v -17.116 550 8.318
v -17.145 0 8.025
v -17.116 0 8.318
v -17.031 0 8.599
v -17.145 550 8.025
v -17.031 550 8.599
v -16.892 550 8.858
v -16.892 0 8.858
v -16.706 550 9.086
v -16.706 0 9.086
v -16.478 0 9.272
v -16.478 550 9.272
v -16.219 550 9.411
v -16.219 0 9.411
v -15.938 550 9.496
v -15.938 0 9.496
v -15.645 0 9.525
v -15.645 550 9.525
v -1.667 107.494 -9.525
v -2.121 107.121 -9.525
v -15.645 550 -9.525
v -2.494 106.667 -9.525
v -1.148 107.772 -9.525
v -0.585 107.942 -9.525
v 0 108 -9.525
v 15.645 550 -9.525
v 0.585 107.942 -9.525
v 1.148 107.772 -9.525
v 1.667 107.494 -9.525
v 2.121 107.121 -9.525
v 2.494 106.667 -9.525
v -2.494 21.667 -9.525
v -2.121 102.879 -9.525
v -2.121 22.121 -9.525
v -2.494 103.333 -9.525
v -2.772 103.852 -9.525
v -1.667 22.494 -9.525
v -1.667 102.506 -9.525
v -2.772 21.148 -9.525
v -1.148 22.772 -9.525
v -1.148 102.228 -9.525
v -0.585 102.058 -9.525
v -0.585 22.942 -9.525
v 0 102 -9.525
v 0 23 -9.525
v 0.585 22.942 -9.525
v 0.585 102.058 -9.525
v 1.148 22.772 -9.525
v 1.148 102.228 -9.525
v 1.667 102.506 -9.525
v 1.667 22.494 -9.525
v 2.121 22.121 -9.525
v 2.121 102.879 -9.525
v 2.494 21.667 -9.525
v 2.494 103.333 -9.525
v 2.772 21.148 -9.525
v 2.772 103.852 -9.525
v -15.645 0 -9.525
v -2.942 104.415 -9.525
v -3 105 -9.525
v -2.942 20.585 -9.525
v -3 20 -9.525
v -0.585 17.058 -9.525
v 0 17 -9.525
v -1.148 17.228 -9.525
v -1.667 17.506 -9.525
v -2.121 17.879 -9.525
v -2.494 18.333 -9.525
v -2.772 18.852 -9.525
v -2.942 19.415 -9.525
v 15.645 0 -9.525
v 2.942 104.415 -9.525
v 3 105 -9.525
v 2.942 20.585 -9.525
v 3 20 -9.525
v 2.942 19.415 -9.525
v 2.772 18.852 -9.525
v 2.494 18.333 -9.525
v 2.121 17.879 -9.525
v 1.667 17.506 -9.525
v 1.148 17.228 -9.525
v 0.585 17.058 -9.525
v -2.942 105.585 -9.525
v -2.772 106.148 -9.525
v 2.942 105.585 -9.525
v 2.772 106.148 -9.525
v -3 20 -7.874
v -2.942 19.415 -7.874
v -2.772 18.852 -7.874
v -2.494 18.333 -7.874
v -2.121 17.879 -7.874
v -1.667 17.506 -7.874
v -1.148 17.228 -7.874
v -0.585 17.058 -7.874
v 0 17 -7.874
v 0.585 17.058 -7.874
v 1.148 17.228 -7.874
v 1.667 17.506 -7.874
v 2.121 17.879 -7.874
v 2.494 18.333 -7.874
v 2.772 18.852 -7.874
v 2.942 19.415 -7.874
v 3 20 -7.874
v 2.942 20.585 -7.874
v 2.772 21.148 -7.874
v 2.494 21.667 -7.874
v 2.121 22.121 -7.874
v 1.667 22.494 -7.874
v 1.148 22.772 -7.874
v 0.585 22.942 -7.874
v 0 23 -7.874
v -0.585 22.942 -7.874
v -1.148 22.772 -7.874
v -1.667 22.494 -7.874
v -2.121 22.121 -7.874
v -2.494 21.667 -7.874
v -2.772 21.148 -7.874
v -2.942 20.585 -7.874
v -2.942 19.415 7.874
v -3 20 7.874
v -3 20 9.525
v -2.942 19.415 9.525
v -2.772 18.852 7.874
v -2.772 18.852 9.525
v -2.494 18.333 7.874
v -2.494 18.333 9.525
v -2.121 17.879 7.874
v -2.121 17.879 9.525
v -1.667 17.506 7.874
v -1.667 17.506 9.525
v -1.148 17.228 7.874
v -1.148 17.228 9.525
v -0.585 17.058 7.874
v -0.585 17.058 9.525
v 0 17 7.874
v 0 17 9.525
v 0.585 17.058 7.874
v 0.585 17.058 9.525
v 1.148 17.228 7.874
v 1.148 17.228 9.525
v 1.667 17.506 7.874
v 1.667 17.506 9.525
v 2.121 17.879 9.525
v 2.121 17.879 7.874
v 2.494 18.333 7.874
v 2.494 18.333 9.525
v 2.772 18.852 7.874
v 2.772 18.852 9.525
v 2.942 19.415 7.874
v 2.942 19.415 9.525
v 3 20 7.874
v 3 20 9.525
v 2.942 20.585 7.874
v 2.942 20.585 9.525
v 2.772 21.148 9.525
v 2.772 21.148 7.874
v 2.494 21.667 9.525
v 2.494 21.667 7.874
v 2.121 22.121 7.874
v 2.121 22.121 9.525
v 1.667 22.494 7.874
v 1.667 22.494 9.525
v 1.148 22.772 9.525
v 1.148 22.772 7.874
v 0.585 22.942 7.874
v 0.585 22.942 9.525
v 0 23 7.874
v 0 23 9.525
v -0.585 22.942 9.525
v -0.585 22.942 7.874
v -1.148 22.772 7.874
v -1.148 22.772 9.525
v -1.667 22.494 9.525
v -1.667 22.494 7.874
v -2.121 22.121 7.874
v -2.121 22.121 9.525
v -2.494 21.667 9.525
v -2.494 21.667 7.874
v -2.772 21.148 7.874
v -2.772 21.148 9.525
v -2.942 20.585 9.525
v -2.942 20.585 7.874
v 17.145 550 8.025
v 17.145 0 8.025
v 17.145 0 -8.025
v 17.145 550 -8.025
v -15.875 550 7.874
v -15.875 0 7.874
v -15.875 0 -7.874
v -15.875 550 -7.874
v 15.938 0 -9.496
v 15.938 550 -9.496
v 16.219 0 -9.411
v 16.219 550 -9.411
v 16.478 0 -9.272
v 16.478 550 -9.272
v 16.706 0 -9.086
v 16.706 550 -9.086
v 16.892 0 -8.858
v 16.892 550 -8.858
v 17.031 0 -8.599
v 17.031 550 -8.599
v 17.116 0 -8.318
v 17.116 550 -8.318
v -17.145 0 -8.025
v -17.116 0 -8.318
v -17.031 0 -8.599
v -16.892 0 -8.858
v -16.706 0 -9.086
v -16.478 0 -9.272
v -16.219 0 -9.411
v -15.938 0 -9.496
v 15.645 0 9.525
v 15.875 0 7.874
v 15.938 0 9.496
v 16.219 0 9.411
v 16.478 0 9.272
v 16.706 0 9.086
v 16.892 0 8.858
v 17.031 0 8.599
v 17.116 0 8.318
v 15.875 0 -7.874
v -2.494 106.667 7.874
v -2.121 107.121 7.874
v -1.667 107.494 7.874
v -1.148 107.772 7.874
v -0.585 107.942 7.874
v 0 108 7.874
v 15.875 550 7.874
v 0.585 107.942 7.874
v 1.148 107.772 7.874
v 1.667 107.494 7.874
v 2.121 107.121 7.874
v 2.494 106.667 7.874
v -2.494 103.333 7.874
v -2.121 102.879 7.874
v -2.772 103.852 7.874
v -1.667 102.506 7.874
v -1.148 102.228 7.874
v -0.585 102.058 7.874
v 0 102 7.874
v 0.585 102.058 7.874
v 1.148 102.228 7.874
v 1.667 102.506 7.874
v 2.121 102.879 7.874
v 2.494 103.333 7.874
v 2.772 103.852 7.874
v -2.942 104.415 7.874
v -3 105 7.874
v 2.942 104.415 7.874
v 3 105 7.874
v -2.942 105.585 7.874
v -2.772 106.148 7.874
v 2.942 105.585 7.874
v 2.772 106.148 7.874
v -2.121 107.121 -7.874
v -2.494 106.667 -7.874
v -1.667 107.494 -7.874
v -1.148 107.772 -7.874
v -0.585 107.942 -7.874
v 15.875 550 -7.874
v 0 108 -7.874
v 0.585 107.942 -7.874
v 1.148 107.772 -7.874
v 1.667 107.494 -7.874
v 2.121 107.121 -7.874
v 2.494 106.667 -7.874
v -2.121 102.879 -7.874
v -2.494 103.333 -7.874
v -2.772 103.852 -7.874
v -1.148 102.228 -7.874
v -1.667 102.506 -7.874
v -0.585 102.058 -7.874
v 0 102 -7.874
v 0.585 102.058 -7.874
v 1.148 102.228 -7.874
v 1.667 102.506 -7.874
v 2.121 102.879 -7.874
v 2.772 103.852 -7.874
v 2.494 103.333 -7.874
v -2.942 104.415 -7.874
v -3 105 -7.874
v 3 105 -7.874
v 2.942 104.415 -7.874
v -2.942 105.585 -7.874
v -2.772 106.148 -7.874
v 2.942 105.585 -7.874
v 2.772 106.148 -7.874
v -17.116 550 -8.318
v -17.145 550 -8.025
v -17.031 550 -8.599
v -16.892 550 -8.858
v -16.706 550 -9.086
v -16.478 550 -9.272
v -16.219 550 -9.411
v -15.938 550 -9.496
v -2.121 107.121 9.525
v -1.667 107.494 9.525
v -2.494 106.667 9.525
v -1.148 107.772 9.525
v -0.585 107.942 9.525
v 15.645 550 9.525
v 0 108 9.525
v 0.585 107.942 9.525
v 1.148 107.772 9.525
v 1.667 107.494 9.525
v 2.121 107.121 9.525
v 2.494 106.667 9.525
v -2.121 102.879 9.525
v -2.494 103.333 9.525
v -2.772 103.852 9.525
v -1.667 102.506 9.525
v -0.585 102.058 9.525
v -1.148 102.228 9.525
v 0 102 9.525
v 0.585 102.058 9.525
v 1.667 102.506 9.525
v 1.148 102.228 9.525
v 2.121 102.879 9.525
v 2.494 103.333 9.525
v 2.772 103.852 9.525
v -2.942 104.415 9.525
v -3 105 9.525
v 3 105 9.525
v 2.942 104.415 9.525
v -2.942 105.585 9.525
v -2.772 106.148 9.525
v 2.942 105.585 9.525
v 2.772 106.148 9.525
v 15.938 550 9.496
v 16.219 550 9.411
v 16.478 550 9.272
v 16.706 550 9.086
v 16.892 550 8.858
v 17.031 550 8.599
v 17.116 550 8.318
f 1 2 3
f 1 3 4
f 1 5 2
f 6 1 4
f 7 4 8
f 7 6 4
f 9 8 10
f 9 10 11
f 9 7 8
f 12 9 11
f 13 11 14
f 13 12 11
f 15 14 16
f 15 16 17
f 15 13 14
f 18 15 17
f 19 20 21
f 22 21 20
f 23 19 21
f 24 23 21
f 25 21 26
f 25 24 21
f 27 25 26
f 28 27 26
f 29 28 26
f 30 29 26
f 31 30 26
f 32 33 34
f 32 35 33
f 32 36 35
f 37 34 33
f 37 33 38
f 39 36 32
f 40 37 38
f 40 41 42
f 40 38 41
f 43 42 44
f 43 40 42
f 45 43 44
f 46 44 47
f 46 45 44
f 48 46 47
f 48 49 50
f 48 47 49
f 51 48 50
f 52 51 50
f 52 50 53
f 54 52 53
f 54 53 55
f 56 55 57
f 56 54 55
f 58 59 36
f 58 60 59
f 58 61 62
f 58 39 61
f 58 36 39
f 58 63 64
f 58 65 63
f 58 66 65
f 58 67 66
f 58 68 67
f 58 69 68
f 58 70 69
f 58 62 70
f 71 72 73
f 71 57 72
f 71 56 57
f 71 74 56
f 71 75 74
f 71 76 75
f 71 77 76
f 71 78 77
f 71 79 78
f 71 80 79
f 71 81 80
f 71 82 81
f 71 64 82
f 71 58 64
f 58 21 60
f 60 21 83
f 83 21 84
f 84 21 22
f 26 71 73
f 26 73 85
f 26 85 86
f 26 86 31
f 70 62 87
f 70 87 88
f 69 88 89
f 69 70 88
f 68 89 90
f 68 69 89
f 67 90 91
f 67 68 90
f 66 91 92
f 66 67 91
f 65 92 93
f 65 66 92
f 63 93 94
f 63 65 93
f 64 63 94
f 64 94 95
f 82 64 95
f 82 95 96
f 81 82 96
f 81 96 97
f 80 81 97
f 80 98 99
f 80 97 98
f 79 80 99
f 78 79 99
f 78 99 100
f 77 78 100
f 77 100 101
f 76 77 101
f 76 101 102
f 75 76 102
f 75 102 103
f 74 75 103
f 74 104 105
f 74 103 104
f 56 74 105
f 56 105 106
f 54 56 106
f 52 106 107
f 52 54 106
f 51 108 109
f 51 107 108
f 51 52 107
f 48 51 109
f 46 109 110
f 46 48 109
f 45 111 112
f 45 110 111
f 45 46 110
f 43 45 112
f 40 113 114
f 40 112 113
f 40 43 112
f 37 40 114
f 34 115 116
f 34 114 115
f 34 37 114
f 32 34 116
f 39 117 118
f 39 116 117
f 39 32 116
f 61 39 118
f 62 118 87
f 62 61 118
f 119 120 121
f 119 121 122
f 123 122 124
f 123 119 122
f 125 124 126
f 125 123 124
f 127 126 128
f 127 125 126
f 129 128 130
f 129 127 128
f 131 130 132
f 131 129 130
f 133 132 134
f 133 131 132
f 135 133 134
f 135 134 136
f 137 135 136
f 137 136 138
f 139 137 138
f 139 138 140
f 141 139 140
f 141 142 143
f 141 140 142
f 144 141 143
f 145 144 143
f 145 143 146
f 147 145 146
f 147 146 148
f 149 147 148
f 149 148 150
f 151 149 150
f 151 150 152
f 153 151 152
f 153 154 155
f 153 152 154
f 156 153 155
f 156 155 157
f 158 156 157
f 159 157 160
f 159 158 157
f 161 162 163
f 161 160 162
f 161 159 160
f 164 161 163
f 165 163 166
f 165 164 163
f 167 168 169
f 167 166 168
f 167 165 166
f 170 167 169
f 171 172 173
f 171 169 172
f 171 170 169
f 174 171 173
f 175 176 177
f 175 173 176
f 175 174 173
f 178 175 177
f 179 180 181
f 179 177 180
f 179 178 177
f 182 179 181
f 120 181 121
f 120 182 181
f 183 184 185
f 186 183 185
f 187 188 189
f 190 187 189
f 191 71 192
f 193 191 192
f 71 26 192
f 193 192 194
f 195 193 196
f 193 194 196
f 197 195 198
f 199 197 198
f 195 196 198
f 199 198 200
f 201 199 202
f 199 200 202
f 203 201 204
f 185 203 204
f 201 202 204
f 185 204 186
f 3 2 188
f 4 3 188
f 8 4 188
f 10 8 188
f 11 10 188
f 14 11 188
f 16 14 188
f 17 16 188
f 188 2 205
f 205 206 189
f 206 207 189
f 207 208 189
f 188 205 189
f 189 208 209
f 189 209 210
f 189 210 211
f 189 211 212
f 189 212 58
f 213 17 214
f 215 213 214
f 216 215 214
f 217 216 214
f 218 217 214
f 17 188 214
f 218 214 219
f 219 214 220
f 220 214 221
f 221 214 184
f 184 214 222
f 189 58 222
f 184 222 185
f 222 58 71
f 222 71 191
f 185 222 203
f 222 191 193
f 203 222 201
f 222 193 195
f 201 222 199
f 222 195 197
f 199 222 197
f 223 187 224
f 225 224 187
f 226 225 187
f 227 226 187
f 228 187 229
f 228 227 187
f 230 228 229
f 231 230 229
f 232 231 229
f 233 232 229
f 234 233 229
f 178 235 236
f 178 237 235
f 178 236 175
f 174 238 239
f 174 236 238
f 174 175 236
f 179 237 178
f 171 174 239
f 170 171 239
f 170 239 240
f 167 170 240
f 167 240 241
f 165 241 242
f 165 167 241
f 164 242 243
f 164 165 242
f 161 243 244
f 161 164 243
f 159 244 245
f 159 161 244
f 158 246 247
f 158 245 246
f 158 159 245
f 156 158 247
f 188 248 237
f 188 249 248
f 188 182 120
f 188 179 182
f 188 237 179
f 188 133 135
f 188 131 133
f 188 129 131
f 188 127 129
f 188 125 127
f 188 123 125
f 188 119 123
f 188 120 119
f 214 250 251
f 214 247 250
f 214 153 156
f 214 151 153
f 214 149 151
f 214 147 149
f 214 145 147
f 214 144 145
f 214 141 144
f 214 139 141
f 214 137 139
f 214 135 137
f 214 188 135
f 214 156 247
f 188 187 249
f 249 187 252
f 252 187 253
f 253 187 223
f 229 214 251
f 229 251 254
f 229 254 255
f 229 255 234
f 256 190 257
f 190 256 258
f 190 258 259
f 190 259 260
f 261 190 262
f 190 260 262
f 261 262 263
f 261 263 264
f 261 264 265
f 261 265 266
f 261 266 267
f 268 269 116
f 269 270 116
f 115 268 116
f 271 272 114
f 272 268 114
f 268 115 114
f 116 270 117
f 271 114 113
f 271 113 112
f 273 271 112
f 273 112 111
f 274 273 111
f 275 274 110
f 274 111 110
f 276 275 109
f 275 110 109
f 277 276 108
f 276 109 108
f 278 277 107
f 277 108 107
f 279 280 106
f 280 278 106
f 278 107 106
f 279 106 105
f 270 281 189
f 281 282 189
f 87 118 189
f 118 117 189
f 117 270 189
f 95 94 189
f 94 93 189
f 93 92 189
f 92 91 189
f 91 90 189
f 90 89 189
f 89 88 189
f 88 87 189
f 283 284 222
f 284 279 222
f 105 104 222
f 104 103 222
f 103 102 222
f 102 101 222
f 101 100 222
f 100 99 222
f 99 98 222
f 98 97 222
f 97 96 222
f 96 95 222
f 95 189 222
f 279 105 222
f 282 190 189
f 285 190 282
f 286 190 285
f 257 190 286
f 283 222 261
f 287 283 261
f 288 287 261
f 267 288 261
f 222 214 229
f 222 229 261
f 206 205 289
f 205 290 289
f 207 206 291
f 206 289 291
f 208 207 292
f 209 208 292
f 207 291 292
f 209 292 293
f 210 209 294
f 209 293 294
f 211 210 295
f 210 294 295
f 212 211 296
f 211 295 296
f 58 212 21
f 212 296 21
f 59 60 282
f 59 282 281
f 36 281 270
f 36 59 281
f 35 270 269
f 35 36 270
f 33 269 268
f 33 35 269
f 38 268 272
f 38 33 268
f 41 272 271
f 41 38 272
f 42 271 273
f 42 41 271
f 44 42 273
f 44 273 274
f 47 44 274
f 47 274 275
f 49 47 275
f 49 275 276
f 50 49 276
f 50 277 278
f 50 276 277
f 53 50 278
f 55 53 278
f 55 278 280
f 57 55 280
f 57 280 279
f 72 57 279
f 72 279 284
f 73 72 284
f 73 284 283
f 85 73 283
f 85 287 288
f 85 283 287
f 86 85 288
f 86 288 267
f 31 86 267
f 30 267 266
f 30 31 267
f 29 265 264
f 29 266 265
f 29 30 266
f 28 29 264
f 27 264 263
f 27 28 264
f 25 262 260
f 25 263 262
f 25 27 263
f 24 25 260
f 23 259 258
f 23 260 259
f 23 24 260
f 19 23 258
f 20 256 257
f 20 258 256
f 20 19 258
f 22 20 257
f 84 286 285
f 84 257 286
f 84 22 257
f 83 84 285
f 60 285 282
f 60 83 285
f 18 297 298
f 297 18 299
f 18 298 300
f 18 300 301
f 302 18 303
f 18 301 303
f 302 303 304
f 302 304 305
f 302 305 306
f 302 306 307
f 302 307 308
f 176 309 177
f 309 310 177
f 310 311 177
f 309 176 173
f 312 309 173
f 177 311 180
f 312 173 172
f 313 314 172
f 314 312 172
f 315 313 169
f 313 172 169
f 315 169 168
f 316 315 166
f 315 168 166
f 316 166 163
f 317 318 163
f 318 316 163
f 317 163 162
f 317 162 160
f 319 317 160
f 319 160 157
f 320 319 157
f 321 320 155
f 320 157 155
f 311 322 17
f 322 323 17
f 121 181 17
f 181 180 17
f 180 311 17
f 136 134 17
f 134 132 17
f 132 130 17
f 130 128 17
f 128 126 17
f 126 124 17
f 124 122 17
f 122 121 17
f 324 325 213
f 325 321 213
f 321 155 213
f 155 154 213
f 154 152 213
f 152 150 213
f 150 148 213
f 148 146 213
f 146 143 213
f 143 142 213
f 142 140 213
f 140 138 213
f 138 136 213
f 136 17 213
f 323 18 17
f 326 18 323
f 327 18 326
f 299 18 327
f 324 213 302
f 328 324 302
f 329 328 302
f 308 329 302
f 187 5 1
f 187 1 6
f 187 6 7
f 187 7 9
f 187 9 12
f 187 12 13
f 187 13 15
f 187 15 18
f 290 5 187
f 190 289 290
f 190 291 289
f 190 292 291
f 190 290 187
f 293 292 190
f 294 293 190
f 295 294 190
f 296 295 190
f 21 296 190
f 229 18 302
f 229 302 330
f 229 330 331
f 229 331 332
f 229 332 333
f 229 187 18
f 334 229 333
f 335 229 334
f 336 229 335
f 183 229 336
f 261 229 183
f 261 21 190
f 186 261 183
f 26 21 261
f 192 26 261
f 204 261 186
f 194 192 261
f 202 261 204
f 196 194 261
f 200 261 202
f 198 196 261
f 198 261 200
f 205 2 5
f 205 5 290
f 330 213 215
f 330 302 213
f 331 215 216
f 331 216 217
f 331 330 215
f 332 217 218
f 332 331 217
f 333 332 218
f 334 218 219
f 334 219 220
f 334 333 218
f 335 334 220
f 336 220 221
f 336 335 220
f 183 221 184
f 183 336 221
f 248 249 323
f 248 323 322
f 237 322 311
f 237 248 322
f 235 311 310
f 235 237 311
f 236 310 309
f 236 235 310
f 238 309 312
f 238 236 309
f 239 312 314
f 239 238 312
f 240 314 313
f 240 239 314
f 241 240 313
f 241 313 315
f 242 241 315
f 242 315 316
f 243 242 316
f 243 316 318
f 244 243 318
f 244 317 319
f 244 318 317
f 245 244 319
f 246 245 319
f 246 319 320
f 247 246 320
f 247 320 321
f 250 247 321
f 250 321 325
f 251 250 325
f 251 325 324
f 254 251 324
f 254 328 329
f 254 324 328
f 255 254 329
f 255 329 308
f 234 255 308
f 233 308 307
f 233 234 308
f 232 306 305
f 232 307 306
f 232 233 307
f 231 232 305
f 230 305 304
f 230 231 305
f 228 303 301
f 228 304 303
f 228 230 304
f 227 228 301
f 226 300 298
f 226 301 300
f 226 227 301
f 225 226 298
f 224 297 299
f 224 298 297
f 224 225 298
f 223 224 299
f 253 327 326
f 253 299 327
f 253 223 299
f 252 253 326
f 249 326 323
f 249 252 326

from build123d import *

# Parameters (mm, degrees)
SKETCH1_W               = 34.29
SKETCH1_H               = 19.05
SKETCH1_W_2             = 31.75
SKETCH1_H_2             = 15.748
BOSS_EXTRUDE1_DEPTH     = 550
FILLET1_R               = 1.5
CUT_EXTRUDE1_DEPTH      = 551.59681576
CUT_EXTRUDE1_DEPTH_BACK = 551.59681576
SKETCH2_R               = 3


with BuildPart() as part:
    # Sketch1 → Boss-Extrude1 (new body)
    with BuildSketch(Plane(origin=(0, 0, 0), x_dir=(1, 0, 0), z_dir=(0, 1, 0))):
        Rectangle(SKETCH1_W, SKETCH1_H)
        Rectangle(SKETCH1_W_2, SKETCH1_H_2, mode=Mode.SUBTRACT)
    extrude(amount=BOSS_EXTRUDE1_DEPTH)

    # Fillet1
    fillet1_edges = [part.edges().sort_by_distance(p)[0] for p in [
        (17.145, 275, 9.525),
        (-17.145, 275, 9.525),
        (-17.145, 275, -9.525),
        (17.145, 275, -9.525),
    ]]
    fillet(fillet1_edges, radius=FILLET1_R)

    # Sketch2 → Cut-Extrude1 (cut, two sides: drawn at the far end of the back side and taken through both)
    with BuildSketch(Plane.XY.offset(9.525).offset(-CUT_EXTRUDE1_DEPTH_BACK)):
        with Locations(Location((0, 105, 0), (0, 0, 180))):
            Circle(SKETCH2_R)
        with Locations(Location((0, 20, 0), (0, 0, 180))):
            Circle(SKETCH2_R)
    extrude(amount=CUT_EXTRUDE1_DEPTH + CUT_EXTRUDE1_DEPTH_BACK, mode=Mode.SUBTRACT)


solid = part.part
